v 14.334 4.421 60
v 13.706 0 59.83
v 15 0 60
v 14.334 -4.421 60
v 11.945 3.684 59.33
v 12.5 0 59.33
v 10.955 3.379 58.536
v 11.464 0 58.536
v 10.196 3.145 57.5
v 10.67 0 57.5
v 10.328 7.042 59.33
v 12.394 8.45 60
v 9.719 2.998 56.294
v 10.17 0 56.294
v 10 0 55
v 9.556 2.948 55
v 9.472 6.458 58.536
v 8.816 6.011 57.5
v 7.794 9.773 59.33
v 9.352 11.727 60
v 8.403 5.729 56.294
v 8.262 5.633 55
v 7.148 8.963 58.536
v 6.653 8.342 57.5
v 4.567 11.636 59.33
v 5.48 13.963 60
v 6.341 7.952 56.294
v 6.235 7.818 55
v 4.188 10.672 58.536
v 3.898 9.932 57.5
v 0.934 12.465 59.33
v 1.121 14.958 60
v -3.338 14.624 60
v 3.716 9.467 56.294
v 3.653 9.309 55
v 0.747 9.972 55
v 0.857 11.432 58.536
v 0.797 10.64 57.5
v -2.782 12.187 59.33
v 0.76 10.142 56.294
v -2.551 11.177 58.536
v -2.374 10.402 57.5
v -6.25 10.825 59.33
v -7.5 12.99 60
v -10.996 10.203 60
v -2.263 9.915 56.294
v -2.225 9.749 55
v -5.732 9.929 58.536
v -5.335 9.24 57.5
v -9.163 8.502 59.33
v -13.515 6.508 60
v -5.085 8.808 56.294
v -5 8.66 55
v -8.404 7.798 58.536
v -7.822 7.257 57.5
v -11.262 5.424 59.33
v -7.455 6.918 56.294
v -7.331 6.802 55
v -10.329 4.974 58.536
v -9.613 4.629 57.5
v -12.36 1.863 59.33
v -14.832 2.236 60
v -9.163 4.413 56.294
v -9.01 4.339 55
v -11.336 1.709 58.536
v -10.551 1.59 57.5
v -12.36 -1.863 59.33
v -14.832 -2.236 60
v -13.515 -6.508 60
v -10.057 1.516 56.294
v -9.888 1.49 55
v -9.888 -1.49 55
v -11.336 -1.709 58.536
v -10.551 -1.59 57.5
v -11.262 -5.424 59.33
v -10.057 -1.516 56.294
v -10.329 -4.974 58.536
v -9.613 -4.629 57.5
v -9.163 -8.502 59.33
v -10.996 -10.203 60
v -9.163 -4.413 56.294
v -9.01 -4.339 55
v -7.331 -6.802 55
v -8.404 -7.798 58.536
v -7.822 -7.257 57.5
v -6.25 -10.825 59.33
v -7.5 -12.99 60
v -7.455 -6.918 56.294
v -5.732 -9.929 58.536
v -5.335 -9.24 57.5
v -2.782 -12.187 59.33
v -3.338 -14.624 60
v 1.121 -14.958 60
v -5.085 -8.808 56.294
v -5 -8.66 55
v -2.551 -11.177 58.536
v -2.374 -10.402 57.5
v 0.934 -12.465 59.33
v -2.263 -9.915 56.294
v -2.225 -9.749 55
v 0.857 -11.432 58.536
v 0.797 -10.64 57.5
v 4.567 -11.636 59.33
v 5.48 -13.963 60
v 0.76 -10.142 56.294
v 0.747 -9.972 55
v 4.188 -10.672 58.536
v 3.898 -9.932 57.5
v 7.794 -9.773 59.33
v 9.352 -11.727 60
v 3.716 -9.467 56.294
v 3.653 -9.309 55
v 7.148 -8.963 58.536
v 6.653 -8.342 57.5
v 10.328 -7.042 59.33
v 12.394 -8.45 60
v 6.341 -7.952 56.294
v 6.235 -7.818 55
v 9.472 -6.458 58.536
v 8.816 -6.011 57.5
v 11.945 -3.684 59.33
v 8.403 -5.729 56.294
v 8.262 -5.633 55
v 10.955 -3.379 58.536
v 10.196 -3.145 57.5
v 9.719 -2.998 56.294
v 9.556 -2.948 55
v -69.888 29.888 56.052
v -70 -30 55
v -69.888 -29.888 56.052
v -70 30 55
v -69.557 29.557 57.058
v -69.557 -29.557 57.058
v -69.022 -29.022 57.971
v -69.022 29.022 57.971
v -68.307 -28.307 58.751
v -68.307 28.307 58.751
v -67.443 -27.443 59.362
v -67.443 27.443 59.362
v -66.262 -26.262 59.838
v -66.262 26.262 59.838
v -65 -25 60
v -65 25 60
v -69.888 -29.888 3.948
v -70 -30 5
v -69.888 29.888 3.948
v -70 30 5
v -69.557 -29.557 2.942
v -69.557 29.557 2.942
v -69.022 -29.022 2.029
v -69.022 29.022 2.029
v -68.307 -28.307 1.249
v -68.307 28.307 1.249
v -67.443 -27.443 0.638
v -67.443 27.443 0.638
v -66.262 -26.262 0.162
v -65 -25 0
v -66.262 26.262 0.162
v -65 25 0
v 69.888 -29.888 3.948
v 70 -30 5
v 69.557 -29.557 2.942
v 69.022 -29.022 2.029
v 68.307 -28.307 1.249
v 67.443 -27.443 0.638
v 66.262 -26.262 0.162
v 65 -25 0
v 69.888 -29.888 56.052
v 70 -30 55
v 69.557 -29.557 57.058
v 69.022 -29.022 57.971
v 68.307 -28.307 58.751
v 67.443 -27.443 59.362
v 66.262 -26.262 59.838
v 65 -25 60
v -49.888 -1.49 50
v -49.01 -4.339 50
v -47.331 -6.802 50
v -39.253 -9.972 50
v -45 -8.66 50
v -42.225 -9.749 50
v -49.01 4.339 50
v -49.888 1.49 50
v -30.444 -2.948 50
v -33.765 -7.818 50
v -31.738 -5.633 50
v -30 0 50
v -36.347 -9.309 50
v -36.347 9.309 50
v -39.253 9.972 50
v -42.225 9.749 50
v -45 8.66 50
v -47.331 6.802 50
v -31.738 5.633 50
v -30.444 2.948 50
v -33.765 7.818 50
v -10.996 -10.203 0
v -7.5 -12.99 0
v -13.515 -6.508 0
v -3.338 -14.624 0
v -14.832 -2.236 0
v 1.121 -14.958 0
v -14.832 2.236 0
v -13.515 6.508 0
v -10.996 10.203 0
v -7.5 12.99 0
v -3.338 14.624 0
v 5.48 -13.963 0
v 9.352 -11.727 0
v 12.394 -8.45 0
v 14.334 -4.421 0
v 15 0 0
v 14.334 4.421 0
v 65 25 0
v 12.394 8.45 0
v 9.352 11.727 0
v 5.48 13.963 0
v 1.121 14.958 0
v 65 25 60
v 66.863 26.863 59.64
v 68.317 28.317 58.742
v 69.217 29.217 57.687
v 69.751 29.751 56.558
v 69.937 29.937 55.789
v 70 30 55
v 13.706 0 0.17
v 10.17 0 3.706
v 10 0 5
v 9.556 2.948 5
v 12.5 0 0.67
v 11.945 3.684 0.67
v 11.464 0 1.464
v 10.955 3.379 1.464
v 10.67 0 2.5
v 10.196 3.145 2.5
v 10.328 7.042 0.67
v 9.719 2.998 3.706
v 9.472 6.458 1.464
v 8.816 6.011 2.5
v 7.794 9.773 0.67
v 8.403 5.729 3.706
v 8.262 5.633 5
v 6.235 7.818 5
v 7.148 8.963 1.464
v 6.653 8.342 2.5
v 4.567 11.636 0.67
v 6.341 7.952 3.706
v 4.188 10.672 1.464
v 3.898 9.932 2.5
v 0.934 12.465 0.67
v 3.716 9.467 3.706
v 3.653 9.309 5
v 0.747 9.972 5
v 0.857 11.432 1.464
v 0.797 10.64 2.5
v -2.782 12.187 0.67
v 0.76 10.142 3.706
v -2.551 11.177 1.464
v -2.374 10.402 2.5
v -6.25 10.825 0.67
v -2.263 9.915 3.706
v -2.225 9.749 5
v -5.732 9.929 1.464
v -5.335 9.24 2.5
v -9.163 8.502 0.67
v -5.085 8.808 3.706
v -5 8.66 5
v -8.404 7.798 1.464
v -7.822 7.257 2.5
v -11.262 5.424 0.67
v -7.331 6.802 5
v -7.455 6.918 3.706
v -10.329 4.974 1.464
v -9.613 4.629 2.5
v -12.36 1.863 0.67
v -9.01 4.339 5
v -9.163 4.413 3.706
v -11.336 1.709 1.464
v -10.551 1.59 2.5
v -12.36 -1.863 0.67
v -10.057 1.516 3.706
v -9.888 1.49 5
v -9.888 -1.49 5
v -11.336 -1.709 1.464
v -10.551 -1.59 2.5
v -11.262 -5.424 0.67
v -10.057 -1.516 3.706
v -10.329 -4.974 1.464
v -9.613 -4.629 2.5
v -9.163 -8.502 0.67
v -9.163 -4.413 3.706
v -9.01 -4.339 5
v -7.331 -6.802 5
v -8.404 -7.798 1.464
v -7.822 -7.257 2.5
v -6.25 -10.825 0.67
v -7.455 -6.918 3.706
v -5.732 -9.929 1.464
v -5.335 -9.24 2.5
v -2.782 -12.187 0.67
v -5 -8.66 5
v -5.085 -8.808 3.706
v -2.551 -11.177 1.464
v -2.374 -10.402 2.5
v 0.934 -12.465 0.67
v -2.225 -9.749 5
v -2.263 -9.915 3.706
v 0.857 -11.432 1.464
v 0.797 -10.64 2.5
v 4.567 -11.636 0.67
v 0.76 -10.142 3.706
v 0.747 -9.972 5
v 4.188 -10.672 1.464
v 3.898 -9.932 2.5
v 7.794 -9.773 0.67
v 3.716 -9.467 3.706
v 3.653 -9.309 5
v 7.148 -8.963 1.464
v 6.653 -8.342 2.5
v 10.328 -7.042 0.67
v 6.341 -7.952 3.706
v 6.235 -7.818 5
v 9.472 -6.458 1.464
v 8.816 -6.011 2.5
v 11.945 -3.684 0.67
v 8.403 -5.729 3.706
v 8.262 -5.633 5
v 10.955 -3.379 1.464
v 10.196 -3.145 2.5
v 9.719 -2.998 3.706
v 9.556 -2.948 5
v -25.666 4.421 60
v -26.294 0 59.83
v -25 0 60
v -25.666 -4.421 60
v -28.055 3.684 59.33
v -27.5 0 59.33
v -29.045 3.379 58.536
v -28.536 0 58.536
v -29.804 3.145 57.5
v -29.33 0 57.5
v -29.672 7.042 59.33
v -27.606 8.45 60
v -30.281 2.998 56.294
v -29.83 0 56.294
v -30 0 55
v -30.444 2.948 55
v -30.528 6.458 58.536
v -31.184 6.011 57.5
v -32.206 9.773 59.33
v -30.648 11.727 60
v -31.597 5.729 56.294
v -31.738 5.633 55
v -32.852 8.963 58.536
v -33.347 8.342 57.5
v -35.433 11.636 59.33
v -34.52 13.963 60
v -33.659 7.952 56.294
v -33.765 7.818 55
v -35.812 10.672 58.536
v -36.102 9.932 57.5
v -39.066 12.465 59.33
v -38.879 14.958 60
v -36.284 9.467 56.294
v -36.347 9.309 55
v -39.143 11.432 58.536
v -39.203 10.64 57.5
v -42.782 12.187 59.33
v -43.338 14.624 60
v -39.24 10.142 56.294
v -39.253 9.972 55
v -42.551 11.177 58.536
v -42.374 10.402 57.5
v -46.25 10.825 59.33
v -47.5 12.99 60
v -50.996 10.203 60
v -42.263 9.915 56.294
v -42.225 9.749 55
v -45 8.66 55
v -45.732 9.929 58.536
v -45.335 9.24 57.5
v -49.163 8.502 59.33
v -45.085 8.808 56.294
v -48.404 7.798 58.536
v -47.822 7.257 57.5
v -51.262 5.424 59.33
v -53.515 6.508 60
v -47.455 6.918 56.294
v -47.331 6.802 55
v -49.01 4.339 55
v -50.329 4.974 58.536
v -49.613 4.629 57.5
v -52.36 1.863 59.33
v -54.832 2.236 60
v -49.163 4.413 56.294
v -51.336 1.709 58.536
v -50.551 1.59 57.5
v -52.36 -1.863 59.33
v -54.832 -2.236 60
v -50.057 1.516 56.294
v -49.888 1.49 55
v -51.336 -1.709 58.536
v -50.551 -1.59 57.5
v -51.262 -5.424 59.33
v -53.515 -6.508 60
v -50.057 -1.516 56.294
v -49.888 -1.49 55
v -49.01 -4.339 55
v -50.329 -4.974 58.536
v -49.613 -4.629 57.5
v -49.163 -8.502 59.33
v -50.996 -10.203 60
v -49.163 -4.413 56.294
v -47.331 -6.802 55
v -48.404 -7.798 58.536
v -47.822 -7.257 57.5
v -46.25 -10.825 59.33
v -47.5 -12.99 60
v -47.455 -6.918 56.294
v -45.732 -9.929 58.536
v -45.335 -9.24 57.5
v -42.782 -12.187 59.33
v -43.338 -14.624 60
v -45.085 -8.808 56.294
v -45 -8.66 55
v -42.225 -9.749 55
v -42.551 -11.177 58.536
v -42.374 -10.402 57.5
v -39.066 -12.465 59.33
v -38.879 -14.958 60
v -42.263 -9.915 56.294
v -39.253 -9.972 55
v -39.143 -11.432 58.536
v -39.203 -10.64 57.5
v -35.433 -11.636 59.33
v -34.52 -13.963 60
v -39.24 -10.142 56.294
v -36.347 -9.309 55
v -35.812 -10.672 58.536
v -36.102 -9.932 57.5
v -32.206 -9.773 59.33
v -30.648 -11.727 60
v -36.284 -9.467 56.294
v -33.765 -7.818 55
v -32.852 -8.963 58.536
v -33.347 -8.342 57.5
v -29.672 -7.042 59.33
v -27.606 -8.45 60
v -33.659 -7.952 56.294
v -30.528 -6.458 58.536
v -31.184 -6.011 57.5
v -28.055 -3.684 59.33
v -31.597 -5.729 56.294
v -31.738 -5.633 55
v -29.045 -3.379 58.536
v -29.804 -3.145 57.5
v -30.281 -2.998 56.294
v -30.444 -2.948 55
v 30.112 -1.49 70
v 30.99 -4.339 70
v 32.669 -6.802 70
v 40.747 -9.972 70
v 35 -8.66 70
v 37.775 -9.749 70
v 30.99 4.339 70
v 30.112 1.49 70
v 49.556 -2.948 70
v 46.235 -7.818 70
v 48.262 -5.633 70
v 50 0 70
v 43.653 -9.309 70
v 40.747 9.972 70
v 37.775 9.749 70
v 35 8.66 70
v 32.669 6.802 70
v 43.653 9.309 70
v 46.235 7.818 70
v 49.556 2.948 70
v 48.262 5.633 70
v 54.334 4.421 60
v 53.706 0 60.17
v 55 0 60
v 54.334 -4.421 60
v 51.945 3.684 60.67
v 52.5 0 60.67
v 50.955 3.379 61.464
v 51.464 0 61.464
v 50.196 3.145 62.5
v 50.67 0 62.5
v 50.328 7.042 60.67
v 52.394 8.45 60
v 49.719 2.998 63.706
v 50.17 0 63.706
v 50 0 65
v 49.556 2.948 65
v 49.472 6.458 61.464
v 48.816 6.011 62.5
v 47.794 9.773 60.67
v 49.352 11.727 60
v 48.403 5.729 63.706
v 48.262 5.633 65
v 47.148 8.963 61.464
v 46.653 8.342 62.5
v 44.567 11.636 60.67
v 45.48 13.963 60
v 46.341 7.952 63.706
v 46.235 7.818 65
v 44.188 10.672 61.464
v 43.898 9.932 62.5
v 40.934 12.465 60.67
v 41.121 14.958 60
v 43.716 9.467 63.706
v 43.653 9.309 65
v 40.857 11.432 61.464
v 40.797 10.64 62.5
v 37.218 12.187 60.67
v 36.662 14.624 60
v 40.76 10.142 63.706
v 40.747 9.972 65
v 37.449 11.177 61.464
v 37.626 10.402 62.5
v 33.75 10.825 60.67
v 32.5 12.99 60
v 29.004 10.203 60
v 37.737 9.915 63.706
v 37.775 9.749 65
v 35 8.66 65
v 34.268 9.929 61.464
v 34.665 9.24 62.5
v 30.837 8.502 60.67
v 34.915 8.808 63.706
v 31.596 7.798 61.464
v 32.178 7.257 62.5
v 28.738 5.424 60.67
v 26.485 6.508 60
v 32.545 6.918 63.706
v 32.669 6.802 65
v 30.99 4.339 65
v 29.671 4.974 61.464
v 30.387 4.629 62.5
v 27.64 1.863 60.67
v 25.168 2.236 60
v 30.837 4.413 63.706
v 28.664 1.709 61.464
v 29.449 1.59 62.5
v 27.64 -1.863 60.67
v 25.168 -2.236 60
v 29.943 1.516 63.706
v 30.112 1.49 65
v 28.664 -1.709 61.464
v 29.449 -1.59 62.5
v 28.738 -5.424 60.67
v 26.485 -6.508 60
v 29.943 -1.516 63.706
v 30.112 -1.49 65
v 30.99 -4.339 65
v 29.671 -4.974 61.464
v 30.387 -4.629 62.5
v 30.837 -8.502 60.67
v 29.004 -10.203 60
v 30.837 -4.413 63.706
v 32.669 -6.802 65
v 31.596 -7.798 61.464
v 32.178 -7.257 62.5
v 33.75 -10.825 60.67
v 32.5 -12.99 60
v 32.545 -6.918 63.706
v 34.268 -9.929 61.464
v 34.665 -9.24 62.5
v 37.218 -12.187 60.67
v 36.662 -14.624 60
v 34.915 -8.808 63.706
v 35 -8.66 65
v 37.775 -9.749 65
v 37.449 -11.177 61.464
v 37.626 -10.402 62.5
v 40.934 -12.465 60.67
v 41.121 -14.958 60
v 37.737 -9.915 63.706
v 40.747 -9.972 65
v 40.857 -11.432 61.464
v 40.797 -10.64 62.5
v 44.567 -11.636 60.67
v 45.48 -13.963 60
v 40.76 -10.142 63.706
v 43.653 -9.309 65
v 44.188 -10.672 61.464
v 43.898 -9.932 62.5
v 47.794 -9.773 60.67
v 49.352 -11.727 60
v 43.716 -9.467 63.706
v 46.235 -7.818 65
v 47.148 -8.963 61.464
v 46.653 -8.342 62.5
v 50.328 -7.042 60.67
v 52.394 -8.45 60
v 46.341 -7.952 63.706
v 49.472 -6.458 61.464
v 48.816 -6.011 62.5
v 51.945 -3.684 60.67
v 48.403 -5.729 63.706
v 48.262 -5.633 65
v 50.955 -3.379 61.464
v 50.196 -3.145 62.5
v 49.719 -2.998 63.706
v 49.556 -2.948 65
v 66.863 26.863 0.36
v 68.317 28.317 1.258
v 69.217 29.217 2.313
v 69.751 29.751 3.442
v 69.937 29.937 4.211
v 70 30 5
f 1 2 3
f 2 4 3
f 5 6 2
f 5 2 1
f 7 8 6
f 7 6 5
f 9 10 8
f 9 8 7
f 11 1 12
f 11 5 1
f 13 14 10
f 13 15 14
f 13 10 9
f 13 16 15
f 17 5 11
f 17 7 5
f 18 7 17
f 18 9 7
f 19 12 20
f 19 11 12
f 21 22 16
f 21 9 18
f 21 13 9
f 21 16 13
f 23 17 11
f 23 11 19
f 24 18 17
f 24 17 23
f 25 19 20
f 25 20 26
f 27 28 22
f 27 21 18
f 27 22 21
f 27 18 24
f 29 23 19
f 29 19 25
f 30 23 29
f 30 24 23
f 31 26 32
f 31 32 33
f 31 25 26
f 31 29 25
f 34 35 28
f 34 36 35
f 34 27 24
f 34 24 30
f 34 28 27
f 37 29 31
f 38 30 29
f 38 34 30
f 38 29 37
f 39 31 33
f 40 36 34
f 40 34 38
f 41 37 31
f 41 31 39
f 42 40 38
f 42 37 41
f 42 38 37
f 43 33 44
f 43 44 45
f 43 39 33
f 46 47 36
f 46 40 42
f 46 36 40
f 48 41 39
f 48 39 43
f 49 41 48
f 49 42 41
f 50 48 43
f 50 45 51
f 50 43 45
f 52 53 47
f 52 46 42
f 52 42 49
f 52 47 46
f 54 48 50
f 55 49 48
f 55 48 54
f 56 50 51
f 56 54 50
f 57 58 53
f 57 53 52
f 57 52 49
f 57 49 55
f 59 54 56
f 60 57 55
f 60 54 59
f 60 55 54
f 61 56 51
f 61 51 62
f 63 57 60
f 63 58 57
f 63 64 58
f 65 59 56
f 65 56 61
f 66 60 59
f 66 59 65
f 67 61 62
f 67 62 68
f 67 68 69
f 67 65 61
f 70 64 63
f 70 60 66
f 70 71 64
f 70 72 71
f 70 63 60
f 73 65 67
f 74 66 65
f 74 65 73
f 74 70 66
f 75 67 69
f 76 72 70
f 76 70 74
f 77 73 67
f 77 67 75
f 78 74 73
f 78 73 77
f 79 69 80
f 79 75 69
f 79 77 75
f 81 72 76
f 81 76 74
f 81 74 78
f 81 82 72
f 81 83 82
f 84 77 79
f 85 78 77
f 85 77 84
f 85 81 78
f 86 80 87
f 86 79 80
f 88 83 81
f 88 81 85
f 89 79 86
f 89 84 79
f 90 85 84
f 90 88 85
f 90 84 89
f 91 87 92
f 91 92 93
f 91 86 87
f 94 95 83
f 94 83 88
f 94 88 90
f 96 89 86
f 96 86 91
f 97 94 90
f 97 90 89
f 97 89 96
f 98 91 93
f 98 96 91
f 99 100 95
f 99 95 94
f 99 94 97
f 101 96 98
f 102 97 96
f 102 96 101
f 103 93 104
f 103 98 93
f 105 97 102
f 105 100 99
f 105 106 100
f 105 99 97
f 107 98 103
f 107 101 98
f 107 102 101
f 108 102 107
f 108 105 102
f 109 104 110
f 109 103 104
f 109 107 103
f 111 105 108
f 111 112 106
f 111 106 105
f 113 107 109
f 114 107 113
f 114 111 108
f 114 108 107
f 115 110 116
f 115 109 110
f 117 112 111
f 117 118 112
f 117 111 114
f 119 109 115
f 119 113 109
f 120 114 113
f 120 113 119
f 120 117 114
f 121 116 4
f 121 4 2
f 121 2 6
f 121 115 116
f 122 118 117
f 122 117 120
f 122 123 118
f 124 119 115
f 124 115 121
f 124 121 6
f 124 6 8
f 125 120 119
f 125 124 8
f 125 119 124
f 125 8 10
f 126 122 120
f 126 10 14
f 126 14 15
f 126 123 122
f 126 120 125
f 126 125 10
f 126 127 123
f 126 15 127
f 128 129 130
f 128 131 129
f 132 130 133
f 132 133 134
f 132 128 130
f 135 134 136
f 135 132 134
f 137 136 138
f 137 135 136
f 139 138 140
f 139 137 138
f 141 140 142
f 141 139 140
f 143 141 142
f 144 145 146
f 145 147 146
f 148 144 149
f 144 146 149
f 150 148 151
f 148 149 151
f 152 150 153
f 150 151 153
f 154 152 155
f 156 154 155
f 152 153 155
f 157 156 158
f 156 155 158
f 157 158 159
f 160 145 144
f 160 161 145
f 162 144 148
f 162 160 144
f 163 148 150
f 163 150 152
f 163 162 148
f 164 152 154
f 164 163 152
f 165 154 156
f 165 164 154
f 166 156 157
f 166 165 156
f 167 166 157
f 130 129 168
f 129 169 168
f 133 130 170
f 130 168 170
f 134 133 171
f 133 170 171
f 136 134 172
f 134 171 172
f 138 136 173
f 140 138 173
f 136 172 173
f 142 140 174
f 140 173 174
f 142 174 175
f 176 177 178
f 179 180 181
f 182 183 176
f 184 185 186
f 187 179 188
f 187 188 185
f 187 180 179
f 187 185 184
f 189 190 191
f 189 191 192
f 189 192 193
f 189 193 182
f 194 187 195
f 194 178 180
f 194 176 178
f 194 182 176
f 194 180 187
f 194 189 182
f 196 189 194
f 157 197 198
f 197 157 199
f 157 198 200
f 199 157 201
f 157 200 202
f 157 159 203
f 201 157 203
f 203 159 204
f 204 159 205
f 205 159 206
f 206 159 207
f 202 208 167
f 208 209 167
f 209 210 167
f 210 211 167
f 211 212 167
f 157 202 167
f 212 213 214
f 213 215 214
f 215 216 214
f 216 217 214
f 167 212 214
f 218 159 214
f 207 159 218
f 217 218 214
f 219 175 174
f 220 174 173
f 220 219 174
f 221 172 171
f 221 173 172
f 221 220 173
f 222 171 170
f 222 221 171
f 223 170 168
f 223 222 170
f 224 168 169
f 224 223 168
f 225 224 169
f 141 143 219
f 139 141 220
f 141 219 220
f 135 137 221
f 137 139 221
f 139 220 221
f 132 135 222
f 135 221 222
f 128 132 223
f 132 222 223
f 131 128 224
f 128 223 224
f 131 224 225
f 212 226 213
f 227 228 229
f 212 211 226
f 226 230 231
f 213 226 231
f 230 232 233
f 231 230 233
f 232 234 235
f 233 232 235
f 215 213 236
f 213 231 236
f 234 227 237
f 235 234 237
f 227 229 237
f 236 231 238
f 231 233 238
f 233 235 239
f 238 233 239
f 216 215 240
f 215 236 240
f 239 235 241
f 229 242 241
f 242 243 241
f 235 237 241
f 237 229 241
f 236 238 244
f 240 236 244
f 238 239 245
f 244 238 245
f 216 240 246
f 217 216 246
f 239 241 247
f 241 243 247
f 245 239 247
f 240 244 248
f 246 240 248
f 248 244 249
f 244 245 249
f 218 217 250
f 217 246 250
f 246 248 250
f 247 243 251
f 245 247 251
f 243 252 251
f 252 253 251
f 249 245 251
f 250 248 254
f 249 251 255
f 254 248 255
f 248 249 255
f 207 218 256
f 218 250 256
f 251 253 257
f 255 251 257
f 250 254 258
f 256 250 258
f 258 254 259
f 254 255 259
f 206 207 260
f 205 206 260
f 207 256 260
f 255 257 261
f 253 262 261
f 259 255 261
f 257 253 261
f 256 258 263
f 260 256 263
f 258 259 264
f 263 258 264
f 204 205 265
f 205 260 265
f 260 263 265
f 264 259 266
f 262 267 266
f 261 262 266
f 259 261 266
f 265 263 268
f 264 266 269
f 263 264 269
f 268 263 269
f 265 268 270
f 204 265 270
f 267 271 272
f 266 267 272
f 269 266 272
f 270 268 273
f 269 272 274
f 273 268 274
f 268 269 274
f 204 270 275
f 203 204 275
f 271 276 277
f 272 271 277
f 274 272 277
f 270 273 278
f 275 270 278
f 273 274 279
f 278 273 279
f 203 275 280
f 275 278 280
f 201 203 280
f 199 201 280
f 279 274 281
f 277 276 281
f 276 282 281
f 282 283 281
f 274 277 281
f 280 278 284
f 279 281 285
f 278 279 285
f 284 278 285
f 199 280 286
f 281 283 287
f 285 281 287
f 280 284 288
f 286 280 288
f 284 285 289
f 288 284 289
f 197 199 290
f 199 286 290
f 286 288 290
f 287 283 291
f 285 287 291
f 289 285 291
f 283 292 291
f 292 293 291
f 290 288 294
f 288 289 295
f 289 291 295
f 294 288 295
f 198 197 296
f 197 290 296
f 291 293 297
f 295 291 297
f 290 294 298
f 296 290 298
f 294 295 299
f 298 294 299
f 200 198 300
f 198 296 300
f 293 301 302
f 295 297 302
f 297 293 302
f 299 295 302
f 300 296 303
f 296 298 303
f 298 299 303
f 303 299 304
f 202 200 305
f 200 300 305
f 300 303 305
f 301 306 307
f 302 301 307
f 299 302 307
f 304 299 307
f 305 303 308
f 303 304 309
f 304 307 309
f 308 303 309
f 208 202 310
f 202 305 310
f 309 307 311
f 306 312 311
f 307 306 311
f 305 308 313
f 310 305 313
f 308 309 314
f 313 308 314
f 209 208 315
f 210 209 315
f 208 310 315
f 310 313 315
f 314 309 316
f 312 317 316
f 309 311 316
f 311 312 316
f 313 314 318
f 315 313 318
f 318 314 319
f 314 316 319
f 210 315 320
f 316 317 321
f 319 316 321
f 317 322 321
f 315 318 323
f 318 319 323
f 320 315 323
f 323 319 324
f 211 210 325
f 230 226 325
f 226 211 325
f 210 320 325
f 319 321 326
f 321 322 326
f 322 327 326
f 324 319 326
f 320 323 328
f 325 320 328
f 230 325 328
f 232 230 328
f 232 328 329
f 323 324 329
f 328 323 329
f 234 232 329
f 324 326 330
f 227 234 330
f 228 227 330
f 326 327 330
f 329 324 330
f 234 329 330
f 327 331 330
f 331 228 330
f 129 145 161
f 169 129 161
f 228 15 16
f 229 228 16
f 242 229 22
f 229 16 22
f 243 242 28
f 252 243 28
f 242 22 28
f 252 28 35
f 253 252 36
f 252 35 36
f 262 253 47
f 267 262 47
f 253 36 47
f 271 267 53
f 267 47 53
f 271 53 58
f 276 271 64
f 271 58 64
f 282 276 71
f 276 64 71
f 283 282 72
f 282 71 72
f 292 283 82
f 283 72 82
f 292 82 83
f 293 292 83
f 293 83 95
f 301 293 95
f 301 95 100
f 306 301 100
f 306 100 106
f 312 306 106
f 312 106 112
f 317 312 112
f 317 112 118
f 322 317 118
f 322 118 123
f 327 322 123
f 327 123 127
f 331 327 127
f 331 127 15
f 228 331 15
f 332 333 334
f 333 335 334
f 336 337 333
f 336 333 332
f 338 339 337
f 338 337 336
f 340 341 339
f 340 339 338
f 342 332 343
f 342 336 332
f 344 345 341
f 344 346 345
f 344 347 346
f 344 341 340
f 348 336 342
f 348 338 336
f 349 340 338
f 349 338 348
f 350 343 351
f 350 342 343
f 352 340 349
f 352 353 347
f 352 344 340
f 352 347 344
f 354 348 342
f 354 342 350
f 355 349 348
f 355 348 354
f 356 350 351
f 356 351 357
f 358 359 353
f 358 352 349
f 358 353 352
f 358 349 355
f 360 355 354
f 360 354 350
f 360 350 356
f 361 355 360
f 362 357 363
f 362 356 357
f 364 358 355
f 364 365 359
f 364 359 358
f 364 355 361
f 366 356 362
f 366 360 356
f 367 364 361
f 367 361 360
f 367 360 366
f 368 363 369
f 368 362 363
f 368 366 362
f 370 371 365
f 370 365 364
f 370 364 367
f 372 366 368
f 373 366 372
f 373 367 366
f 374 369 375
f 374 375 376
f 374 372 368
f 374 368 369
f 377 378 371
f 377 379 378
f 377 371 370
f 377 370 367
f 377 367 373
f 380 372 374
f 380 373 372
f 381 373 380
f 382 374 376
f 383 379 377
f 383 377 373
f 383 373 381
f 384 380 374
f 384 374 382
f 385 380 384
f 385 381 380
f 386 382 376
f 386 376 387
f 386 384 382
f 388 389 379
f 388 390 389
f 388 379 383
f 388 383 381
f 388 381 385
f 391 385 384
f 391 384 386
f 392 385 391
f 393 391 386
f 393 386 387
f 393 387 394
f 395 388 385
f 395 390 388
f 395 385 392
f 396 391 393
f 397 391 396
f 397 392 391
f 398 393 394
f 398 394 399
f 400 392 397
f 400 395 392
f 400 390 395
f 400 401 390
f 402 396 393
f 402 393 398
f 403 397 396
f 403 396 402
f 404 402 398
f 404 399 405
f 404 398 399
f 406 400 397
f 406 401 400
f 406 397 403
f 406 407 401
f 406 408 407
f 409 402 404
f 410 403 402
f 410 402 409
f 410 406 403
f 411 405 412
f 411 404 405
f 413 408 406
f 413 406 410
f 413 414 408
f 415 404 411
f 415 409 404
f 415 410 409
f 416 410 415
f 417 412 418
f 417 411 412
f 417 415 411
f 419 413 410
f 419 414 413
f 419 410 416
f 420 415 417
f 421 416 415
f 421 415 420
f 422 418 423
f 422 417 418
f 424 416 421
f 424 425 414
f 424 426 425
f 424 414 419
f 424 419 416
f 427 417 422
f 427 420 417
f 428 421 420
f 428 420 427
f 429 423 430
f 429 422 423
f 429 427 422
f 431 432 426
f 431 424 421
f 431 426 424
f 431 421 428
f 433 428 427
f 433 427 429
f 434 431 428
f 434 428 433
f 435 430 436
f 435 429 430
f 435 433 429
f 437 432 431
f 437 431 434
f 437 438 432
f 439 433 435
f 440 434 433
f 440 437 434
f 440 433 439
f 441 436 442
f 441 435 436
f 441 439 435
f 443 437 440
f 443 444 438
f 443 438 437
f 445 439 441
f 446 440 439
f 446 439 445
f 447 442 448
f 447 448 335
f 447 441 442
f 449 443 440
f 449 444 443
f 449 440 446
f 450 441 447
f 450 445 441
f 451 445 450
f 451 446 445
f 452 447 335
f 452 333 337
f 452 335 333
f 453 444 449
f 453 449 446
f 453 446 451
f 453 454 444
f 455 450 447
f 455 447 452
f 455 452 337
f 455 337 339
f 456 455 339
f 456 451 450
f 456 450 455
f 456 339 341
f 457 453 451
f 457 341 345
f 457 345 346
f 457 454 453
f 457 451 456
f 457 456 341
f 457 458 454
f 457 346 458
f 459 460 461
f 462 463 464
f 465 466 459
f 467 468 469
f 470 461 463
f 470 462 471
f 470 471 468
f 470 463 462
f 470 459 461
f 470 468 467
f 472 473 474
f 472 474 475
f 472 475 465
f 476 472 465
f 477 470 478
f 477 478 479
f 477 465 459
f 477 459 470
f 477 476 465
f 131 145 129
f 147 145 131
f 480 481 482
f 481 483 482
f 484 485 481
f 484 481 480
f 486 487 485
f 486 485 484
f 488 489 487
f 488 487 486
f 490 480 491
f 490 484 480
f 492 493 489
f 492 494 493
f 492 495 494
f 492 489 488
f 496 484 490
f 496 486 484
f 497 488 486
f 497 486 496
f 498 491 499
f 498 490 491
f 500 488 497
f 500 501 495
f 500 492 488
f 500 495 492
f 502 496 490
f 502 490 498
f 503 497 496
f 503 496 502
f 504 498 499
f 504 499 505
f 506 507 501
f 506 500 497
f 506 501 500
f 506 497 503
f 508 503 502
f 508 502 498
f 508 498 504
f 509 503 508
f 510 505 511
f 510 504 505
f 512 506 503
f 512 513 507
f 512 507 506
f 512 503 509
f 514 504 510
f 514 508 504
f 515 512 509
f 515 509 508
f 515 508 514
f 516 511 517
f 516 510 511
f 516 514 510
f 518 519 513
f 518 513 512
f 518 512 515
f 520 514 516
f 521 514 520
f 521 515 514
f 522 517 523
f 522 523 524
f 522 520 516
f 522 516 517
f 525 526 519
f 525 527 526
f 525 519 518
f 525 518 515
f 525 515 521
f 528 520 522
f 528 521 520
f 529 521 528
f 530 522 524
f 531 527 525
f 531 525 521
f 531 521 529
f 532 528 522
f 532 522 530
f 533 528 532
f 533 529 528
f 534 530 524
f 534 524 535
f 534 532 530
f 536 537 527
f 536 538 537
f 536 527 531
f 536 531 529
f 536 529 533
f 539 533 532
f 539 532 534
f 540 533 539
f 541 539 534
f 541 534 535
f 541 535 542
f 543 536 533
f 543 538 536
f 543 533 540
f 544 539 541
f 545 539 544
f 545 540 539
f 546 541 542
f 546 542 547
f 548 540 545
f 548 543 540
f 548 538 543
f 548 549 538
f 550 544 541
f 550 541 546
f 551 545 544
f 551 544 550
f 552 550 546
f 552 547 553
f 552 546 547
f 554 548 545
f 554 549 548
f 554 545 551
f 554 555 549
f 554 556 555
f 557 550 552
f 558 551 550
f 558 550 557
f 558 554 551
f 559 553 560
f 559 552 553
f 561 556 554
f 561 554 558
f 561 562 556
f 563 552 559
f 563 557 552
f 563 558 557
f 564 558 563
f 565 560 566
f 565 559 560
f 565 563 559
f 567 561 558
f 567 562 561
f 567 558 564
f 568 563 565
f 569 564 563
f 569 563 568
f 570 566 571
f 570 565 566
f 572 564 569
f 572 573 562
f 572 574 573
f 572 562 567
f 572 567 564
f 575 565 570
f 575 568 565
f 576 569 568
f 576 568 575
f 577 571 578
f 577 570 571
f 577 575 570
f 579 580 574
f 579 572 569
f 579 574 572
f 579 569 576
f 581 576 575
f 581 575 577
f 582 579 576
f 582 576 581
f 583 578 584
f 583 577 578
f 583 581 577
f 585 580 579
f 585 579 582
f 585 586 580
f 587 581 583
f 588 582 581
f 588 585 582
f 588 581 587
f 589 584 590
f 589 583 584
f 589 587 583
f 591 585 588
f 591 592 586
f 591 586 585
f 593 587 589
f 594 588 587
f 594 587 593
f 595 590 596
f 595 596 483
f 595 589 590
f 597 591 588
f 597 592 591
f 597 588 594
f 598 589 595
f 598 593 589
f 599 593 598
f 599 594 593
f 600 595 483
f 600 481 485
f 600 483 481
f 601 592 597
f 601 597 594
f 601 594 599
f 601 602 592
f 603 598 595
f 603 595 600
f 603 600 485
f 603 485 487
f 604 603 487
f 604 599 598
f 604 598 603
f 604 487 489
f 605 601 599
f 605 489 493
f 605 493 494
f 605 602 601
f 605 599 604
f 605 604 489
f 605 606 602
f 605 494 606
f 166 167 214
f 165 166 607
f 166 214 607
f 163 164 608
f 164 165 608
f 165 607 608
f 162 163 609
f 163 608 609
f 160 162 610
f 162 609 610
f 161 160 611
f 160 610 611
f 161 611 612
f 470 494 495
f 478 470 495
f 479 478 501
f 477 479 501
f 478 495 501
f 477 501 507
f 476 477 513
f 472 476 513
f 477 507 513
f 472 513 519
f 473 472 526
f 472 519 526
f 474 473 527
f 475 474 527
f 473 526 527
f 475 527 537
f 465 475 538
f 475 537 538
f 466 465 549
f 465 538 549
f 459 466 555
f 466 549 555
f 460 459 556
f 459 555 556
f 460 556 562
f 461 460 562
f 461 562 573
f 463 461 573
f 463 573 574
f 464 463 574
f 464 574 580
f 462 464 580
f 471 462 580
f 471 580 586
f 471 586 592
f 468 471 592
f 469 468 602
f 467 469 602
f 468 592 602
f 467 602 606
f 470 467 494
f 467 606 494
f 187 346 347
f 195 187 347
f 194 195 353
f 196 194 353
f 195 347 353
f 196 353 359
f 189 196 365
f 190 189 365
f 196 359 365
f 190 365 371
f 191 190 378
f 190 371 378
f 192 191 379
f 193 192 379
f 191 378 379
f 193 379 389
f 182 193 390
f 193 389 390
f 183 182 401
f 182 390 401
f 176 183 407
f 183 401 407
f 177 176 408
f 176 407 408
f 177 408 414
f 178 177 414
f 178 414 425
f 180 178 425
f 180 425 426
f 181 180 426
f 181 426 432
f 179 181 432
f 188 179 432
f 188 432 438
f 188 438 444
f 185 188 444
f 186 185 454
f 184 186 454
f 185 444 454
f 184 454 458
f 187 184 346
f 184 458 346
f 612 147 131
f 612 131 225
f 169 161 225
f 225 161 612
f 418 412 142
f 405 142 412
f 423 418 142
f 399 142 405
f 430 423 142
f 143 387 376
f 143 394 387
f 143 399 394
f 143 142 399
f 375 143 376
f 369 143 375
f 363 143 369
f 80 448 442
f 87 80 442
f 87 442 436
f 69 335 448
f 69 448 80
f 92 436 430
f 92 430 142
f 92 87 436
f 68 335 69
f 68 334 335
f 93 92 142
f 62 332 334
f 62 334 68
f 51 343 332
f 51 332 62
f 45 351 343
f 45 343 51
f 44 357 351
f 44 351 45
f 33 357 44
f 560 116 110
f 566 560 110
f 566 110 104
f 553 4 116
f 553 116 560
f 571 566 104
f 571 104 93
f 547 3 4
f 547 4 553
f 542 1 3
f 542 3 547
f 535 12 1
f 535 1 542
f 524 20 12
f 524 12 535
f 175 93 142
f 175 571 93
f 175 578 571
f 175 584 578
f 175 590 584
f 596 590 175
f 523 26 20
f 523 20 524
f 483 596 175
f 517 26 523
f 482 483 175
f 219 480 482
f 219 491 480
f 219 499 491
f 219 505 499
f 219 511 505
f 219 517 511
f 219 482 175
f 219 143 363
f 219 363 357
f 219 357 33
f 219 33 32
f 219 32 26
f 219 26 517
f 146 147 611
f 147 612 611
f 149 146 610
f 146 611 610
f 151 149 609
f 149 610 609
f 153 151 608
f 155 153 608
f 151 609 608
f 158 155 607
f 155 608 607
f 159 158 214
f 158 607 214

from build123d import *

# Parameters (mm, degrees)
F0_W     = 140
F0_H     = 60
F1_DEPTH = 60
F3_R     = 10
F5_DEPTH = 10
F4_R     = 10
F6_DEPTH = 96.3
F7_R     = 5
F2_R     = 10
F8_DEPTH = 10
F9_R     = 5


with BuildPart() as f1:
    # F0 (on Top) → F1 (new body)
    with BuildSketch(Plane.XY):
        Rectangle(F0_W, F0_H)
    extrude(amount=F1_DEPTH)

    # F3 (on face) → F5 (join)
    with BuildSketch(Plane.XY.offset(60)):
        with Locations((40, 0)):
            Circle(F3_R)
    extrude(amount=F5_DEPTH)

    # F4 (on face) → F6 (cut)
    with BuildSketch(Plane.XY.offset(60)):
        Circle(F4_R)
    extrude(amount=-F6_DEPTH, mode=Mode.SUBTRACT)

    # F7
    f7_edges = [f1.edges().sort_by_distance(p)[0] for p in [
        (0, -30, 0),
        (-70, 0, 0),
        (70, 0, 0),
        (0, 30, 0),
        (-10, 0, 0),
    ]]
    fillet(f7_edges, radius=F7_R)

    # F2 (on face) → F8 (cut)
    with BuildSketch(Plane.XY.offset(60)):
        with Locations((-40, 0)):
            Circle(F2_R)
    extrude(amount=-F8_DEPTH, mode=Mode.SUBTRACT)

    # F9
    f9_edges = [f1.edges().sort_by_distance(p)[0] for p in [
        (0, -30, 60),
        (-70, 0, 60),
        (70, 0, 60),
        (0, 30, 60),
        (-50, 0, 60),
        (-10, 0, 60),
        (30, 0, 60),
    ]]
    fillet(f9_edges, radius=F9_R)


solid = f1.part
